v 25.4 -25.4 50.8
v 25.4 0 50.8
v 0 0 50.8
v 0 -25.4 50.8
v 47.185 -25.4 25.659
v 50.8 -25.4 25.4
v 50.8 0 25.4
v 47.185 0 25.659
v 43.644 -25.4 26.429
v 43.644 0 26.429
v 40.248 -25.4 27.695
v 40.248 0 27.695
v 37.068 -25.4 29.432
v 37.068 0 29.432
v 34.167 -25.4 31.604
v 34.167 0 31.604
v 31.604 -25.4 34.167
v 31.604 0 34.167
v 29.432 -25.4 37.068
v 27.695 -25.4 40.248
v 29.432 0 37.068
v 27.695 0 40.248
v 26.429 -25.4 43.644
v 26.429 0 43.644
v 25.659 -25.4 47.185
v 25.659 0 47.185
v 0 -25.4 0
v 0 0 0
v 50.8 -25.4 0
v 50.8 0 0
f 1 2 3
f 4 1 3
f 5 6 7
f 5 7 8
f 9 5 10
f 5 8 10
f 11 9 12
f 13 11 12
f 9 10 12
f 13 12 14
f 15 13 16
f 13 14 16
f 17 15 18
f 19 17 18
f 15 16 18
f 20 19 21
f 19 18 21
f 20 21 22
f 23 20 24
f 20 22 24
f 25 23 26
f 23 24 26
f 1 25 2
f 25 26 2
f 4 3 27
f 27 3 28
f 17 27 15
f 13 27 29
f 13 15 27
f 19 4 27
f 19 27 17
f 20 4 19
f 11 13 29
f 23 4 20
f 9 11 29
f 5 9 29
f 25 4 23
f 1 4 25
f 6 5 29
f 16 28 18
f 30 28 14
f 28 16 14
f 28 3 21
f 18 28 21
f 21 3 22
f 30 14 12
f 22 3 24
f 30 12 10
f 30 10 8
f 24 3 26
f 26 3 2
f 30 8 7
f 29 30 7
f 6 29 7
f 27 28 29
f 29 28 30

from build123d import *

# Parameters (mm, degrees)
F1_DEPTH = 25.4


with BuildPart() as f1:
    # F0 (on Front) → F1 (new body)
    with BuildSketch(Plane.XZ):
        with BuildLine():
            Line((25.4, 50.8), (0, 50.8))
            Line((0, 50.8), (0, 0))
            Line((0, 0), (50.8, 0))
            Line((50.8, 0), (50.8, 25.4))
            ThreePointArc((50.8, 25.4), (32.839488, 32.839488), (25.4, 50.8))
        make_face()
    extrude(amount=F1_DEPTH)


solid = f1.part
